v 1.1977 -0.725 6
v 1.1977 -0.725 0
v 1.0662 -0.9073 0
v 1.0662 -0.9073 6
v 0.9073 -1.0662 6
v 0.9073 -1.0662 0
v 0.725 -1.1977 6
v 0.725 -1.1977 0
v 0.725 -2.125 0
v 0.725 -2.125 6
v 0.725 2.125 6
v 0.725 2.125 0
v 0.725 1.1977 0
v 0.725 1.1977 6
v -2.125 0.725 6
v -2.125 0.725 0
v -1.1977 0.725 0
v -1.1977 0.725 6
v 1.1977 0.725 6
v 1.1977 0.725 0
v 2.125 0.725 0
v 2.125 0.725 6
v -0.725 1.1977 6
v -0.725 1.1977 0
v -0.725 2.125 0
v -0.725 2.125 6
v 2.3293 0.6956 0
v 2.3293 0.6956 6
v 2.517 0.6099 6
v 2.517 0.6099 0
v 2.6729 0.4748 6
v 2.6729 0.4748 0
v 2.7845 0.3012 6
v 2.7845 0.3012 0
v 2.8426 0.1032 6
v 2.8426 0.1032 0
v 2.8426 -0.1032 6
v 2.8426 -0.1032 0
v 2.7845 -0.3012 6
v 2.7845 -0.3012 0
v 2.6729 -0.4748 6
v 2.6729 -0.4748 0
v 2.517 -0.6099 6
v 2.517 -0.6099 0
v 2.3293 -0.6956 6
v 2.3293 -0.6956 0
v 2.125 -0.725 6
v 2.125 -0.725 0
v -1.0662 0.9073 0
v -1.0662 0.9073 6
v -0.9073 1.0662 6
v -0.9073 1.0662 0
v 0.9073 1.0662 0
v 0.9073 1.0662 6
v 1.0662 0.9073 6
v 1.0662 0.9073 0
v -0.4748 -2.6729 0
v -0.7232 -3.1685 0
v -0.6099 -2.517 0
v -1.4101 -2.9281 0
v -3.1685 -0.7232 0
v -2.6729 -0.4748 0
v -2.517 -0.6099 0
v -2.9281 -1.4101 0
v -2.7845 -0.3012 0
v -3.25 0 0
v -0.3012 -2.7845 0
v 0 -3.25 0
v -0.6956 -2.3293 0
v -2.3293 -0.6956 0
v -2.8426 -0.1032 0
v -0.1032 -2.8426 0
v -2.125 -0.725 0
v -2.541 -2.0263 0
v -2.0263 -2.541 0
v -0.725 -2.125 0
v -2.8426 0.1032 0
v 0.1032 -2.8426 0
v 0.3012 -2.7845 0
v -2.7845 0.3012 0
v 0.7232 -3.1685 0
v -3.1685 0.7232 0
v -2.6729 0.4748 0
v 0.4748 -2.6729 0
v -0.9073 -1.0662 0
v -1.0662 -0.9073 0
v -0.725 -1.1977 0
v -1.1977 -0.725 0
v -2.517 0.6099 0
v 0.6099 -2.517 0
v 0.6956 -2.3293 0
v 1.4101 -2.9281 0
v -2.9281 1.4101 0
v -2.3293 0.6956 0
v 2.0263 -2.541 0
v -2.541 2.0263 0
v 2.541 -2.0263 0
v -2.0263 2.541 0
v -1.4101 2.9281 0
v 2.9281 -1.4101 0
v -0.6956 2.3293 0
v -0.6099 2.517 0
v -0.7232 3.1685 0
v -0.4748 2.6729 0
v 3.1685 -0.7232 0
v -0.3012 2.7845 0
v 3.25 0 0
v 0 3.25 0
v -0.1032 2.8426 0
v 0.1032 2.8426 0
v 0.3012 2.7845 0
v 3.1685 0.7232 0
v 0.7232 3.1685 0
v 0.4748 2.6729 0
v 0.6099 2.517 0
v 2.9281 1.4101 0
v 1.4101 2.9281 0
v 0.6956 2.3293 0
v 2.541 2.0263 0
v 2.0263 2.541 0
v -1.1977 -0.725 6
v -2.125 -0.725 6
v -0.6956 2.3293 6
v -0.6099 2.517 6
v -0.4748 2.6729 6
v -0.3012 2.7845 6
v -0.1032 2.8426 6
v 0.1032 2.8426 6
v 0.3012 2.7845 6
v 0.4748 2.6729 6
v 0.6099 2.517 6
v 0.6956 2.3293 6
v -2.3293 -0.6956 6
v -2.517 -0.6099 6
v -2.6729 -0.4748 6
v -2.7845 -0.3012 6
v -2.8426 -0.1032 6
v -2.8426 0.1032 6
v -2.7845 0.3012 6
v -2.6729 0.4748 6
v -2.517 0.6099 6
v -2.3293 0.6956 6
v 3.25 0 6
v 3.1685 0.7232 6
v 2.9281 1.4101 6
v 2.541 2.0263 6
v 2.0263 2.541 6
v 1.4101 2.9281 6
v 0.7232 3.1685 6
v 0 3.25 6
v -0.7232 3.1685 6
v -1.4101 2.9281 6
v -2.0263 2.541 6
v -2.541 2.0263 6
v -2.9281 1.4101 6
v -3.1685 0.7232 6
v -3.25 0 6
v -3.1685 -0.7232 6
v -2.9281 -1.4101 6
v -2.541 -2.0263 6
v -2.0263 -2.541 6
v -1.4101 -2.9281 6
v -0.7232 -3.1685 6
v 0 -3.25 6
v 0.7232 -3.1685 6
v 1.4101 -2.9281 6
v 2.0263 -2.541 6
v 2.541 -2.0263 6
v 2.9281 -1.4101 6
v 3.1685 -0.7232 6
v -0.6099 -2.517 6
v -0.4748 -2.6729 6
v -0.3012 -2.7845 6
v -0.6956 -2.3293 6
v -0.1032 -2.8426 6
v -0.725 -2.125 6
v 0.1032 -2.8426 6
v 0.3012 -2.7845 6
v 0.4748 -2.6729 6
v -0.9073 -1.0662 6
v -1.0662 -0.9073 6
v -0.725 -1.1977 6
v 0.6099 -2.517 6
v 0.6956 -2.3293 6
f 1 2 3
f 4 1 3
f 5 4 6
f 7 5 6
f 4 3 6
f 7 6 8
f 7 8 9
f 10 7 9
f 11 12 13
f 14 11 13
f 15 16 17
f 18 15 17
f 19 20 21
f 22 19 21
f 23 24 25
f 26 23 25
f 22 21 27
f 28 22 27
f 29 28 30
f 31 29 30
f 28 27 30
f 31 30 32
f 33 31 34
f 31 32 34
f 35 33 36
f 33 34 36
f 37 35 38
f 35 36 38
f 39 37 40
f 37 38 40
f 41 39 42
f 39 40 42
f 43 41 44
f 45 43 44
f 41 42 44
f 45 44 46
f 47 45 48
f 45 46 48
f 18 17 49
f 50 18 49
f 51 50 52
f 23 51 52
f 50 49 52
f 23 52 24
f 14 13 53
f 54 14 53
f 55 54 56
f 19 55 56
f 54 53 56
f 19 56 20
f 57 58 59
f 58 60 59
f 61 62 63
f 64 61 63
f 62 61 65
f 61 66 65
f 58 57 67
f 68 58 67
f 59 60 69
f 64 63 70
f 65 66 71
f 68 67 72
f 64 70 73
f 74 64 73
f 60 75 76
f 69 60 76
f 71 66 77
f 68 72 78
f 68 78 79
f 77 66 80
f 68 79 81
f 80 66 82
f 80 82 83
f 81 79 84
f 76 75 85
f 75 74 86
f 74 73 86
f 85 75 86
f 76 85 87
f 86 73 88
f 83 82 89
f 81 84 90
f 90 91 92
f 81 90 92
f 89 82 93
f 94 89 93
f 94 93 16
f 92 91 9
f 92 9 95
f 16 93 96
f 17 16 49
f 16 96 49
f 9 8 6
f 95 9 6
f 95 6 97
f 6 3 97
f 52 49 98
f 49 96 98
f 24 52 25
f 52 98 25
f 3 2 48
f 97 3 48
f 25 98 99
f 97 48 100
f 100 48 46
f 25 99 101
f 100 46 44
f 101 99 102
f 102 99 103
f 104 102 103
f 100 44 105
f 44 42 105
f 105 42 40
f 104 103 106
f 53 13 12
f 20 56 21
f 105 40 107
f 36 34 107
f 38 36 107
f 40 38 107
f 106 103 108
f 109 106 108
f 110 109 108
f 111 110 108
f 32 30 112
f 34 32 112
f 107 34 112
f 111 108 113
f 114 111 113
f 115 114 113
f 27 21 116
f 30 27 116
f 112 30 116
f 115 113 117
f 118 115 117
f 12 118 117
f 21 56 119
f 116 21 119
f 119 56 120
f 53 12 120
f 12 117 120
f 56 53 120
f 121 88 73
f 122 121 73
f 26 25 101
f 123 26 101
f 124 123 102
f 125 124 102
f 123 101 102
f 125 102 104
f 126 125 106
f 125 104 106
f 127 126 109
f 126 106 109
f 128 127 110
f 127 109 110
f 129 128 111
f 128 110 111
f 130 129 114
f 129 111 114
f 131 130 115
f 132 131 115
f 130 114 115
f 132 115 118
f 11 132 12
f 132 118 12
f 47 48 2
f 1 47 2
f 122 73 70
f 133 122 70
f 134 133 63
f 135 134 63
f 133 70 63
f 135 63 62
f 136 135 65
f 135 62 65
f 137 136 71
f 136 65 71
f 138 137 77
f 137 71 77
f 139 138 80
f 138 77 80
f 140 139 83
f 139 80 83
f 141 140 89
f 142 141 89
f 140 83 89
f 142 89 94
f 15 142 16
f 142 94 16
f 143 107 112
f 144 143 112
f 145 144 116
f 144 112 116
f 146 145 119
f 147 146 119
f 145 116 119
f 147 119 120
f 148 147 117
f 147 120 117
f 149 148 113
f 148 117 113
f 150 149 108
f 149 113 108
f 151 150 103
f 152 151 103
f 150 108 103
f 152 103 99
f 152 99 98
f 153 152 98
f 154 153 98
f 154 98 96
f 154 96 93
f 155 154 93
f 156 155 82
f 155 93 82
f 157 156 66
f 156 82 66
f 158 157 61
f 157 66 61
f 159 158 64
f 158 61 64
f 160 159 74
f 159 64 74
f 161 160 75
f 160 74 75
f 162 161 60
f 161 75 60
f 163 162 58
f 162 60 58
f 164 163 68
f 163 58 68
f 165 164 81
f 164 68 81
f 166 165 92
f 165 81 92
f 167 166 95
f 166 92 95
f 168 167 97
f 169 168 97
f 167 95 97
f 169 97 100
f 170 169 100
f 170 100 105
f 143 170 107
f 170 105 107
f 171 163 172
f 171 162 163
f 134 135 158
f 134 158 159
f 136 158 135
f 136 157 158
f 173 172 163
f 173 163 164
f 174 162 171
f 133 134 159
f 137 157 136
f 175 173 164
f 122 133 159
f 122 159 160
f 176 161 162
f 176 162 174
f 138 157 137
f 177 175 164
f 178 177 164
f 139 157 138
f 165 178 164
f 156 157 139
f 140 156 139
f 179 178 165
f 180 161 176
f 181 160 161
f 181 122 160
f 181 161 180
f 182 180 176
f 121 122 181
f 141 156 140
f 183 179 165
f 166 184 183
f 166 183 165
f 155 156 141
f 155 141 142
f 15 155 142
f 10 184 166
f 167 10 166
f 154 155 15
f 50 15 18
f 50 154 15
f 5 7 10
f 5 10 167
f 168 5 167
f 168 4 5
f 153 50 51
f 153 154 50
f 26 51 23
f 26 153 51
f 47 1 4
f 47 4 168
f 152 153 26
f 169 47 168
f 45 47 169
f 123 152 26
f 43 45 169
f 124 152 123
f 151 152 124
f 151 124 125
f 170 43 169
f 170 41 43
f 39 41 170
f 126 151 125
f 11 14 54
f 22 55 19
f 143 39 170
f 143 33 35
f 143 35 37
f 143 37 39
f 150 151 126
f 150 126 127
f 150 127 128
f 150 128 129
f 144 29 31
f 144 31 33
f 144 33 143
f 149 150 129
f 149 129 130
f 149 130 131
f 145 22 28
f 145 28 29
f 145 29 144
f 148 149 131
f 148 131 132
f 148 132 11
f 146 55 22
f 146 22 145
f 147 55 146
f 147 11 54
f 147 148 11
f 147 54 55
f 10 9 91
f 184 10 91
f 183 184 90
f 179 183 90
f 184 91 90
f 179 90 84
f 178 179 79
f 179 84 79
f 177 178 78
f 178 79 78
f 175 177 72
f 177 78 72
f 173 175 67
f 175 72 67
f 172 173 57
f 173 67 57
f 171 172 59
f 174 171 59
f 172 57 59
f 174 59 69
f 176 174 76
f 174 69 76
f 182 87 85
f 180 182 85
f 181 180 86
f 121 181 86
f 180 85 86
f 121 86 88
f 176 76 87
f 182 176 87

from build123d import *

# Parameters (mm, degrees)
ESQUISSE1_R        = 3.25
BOSS_EXTRU_1_DEPTH = 6


with BuildPart() as part:
    # Esquisse1 → Boss.-Extru.1 (new body)
    with BuildSketch(Plane.XY):
        Circle(ESQUISSE1_R)
        with BuildLine():
            Line((2.125, -0.725), (1.197653957, -0.725))
            ThreePointArc((1.197653957, -0.725), (0.989949494, -0.989949494), (0.725, -1.197653957))
            Line((0.725, -1.197653957), (0.725, -2.125))
            ThreePointArc((0.725, -2.125), (0, -2.85), (-0.725, -2.125))
            Line((-0.725, -2.125), (-0.725, -1.197653957))
            ThreePointArc((-0.725, -1.197653957), (-0.989949494, -0.989949494), (-1.197653957, -0.725))
            Line((-1.197653957, -0.725), (-2.125, -0.725))
            ThreePointArc((-2.125, -0.725), (-2.85, 0), (-2.125, 0.725))
            Line((-2.125, 0.725), (-1.197653957, 0.725))
            ThreePointArc((-1.197653957, 0.725), (-0.989949494, 0.989949494), (-0.725, 1.197653957))
            Line((-0.725, 1.197653957), (-0.725, 2.125))
            ThreePointArc((-0.725, 2.125), (0, 2.85), (0.725, 2.125))
            Line((0.725, 2.125), (0.725, 1.197653957))
            ThreePointArc((0.725, 1.197653957), (0.989949494, 0.989949494), (1.197653957, 0.725))
            Line((1.197653957, 0.725), (2.125, 0.725))
            ThreePointArc((2.125, 0.725), (2.85, 0), (2.125, -0.725))
        make_face(mode=Mode.SUBTRACT)
    extrude(amount=BOSS_EXTRU_1_DEPTH)


solid = part.part
